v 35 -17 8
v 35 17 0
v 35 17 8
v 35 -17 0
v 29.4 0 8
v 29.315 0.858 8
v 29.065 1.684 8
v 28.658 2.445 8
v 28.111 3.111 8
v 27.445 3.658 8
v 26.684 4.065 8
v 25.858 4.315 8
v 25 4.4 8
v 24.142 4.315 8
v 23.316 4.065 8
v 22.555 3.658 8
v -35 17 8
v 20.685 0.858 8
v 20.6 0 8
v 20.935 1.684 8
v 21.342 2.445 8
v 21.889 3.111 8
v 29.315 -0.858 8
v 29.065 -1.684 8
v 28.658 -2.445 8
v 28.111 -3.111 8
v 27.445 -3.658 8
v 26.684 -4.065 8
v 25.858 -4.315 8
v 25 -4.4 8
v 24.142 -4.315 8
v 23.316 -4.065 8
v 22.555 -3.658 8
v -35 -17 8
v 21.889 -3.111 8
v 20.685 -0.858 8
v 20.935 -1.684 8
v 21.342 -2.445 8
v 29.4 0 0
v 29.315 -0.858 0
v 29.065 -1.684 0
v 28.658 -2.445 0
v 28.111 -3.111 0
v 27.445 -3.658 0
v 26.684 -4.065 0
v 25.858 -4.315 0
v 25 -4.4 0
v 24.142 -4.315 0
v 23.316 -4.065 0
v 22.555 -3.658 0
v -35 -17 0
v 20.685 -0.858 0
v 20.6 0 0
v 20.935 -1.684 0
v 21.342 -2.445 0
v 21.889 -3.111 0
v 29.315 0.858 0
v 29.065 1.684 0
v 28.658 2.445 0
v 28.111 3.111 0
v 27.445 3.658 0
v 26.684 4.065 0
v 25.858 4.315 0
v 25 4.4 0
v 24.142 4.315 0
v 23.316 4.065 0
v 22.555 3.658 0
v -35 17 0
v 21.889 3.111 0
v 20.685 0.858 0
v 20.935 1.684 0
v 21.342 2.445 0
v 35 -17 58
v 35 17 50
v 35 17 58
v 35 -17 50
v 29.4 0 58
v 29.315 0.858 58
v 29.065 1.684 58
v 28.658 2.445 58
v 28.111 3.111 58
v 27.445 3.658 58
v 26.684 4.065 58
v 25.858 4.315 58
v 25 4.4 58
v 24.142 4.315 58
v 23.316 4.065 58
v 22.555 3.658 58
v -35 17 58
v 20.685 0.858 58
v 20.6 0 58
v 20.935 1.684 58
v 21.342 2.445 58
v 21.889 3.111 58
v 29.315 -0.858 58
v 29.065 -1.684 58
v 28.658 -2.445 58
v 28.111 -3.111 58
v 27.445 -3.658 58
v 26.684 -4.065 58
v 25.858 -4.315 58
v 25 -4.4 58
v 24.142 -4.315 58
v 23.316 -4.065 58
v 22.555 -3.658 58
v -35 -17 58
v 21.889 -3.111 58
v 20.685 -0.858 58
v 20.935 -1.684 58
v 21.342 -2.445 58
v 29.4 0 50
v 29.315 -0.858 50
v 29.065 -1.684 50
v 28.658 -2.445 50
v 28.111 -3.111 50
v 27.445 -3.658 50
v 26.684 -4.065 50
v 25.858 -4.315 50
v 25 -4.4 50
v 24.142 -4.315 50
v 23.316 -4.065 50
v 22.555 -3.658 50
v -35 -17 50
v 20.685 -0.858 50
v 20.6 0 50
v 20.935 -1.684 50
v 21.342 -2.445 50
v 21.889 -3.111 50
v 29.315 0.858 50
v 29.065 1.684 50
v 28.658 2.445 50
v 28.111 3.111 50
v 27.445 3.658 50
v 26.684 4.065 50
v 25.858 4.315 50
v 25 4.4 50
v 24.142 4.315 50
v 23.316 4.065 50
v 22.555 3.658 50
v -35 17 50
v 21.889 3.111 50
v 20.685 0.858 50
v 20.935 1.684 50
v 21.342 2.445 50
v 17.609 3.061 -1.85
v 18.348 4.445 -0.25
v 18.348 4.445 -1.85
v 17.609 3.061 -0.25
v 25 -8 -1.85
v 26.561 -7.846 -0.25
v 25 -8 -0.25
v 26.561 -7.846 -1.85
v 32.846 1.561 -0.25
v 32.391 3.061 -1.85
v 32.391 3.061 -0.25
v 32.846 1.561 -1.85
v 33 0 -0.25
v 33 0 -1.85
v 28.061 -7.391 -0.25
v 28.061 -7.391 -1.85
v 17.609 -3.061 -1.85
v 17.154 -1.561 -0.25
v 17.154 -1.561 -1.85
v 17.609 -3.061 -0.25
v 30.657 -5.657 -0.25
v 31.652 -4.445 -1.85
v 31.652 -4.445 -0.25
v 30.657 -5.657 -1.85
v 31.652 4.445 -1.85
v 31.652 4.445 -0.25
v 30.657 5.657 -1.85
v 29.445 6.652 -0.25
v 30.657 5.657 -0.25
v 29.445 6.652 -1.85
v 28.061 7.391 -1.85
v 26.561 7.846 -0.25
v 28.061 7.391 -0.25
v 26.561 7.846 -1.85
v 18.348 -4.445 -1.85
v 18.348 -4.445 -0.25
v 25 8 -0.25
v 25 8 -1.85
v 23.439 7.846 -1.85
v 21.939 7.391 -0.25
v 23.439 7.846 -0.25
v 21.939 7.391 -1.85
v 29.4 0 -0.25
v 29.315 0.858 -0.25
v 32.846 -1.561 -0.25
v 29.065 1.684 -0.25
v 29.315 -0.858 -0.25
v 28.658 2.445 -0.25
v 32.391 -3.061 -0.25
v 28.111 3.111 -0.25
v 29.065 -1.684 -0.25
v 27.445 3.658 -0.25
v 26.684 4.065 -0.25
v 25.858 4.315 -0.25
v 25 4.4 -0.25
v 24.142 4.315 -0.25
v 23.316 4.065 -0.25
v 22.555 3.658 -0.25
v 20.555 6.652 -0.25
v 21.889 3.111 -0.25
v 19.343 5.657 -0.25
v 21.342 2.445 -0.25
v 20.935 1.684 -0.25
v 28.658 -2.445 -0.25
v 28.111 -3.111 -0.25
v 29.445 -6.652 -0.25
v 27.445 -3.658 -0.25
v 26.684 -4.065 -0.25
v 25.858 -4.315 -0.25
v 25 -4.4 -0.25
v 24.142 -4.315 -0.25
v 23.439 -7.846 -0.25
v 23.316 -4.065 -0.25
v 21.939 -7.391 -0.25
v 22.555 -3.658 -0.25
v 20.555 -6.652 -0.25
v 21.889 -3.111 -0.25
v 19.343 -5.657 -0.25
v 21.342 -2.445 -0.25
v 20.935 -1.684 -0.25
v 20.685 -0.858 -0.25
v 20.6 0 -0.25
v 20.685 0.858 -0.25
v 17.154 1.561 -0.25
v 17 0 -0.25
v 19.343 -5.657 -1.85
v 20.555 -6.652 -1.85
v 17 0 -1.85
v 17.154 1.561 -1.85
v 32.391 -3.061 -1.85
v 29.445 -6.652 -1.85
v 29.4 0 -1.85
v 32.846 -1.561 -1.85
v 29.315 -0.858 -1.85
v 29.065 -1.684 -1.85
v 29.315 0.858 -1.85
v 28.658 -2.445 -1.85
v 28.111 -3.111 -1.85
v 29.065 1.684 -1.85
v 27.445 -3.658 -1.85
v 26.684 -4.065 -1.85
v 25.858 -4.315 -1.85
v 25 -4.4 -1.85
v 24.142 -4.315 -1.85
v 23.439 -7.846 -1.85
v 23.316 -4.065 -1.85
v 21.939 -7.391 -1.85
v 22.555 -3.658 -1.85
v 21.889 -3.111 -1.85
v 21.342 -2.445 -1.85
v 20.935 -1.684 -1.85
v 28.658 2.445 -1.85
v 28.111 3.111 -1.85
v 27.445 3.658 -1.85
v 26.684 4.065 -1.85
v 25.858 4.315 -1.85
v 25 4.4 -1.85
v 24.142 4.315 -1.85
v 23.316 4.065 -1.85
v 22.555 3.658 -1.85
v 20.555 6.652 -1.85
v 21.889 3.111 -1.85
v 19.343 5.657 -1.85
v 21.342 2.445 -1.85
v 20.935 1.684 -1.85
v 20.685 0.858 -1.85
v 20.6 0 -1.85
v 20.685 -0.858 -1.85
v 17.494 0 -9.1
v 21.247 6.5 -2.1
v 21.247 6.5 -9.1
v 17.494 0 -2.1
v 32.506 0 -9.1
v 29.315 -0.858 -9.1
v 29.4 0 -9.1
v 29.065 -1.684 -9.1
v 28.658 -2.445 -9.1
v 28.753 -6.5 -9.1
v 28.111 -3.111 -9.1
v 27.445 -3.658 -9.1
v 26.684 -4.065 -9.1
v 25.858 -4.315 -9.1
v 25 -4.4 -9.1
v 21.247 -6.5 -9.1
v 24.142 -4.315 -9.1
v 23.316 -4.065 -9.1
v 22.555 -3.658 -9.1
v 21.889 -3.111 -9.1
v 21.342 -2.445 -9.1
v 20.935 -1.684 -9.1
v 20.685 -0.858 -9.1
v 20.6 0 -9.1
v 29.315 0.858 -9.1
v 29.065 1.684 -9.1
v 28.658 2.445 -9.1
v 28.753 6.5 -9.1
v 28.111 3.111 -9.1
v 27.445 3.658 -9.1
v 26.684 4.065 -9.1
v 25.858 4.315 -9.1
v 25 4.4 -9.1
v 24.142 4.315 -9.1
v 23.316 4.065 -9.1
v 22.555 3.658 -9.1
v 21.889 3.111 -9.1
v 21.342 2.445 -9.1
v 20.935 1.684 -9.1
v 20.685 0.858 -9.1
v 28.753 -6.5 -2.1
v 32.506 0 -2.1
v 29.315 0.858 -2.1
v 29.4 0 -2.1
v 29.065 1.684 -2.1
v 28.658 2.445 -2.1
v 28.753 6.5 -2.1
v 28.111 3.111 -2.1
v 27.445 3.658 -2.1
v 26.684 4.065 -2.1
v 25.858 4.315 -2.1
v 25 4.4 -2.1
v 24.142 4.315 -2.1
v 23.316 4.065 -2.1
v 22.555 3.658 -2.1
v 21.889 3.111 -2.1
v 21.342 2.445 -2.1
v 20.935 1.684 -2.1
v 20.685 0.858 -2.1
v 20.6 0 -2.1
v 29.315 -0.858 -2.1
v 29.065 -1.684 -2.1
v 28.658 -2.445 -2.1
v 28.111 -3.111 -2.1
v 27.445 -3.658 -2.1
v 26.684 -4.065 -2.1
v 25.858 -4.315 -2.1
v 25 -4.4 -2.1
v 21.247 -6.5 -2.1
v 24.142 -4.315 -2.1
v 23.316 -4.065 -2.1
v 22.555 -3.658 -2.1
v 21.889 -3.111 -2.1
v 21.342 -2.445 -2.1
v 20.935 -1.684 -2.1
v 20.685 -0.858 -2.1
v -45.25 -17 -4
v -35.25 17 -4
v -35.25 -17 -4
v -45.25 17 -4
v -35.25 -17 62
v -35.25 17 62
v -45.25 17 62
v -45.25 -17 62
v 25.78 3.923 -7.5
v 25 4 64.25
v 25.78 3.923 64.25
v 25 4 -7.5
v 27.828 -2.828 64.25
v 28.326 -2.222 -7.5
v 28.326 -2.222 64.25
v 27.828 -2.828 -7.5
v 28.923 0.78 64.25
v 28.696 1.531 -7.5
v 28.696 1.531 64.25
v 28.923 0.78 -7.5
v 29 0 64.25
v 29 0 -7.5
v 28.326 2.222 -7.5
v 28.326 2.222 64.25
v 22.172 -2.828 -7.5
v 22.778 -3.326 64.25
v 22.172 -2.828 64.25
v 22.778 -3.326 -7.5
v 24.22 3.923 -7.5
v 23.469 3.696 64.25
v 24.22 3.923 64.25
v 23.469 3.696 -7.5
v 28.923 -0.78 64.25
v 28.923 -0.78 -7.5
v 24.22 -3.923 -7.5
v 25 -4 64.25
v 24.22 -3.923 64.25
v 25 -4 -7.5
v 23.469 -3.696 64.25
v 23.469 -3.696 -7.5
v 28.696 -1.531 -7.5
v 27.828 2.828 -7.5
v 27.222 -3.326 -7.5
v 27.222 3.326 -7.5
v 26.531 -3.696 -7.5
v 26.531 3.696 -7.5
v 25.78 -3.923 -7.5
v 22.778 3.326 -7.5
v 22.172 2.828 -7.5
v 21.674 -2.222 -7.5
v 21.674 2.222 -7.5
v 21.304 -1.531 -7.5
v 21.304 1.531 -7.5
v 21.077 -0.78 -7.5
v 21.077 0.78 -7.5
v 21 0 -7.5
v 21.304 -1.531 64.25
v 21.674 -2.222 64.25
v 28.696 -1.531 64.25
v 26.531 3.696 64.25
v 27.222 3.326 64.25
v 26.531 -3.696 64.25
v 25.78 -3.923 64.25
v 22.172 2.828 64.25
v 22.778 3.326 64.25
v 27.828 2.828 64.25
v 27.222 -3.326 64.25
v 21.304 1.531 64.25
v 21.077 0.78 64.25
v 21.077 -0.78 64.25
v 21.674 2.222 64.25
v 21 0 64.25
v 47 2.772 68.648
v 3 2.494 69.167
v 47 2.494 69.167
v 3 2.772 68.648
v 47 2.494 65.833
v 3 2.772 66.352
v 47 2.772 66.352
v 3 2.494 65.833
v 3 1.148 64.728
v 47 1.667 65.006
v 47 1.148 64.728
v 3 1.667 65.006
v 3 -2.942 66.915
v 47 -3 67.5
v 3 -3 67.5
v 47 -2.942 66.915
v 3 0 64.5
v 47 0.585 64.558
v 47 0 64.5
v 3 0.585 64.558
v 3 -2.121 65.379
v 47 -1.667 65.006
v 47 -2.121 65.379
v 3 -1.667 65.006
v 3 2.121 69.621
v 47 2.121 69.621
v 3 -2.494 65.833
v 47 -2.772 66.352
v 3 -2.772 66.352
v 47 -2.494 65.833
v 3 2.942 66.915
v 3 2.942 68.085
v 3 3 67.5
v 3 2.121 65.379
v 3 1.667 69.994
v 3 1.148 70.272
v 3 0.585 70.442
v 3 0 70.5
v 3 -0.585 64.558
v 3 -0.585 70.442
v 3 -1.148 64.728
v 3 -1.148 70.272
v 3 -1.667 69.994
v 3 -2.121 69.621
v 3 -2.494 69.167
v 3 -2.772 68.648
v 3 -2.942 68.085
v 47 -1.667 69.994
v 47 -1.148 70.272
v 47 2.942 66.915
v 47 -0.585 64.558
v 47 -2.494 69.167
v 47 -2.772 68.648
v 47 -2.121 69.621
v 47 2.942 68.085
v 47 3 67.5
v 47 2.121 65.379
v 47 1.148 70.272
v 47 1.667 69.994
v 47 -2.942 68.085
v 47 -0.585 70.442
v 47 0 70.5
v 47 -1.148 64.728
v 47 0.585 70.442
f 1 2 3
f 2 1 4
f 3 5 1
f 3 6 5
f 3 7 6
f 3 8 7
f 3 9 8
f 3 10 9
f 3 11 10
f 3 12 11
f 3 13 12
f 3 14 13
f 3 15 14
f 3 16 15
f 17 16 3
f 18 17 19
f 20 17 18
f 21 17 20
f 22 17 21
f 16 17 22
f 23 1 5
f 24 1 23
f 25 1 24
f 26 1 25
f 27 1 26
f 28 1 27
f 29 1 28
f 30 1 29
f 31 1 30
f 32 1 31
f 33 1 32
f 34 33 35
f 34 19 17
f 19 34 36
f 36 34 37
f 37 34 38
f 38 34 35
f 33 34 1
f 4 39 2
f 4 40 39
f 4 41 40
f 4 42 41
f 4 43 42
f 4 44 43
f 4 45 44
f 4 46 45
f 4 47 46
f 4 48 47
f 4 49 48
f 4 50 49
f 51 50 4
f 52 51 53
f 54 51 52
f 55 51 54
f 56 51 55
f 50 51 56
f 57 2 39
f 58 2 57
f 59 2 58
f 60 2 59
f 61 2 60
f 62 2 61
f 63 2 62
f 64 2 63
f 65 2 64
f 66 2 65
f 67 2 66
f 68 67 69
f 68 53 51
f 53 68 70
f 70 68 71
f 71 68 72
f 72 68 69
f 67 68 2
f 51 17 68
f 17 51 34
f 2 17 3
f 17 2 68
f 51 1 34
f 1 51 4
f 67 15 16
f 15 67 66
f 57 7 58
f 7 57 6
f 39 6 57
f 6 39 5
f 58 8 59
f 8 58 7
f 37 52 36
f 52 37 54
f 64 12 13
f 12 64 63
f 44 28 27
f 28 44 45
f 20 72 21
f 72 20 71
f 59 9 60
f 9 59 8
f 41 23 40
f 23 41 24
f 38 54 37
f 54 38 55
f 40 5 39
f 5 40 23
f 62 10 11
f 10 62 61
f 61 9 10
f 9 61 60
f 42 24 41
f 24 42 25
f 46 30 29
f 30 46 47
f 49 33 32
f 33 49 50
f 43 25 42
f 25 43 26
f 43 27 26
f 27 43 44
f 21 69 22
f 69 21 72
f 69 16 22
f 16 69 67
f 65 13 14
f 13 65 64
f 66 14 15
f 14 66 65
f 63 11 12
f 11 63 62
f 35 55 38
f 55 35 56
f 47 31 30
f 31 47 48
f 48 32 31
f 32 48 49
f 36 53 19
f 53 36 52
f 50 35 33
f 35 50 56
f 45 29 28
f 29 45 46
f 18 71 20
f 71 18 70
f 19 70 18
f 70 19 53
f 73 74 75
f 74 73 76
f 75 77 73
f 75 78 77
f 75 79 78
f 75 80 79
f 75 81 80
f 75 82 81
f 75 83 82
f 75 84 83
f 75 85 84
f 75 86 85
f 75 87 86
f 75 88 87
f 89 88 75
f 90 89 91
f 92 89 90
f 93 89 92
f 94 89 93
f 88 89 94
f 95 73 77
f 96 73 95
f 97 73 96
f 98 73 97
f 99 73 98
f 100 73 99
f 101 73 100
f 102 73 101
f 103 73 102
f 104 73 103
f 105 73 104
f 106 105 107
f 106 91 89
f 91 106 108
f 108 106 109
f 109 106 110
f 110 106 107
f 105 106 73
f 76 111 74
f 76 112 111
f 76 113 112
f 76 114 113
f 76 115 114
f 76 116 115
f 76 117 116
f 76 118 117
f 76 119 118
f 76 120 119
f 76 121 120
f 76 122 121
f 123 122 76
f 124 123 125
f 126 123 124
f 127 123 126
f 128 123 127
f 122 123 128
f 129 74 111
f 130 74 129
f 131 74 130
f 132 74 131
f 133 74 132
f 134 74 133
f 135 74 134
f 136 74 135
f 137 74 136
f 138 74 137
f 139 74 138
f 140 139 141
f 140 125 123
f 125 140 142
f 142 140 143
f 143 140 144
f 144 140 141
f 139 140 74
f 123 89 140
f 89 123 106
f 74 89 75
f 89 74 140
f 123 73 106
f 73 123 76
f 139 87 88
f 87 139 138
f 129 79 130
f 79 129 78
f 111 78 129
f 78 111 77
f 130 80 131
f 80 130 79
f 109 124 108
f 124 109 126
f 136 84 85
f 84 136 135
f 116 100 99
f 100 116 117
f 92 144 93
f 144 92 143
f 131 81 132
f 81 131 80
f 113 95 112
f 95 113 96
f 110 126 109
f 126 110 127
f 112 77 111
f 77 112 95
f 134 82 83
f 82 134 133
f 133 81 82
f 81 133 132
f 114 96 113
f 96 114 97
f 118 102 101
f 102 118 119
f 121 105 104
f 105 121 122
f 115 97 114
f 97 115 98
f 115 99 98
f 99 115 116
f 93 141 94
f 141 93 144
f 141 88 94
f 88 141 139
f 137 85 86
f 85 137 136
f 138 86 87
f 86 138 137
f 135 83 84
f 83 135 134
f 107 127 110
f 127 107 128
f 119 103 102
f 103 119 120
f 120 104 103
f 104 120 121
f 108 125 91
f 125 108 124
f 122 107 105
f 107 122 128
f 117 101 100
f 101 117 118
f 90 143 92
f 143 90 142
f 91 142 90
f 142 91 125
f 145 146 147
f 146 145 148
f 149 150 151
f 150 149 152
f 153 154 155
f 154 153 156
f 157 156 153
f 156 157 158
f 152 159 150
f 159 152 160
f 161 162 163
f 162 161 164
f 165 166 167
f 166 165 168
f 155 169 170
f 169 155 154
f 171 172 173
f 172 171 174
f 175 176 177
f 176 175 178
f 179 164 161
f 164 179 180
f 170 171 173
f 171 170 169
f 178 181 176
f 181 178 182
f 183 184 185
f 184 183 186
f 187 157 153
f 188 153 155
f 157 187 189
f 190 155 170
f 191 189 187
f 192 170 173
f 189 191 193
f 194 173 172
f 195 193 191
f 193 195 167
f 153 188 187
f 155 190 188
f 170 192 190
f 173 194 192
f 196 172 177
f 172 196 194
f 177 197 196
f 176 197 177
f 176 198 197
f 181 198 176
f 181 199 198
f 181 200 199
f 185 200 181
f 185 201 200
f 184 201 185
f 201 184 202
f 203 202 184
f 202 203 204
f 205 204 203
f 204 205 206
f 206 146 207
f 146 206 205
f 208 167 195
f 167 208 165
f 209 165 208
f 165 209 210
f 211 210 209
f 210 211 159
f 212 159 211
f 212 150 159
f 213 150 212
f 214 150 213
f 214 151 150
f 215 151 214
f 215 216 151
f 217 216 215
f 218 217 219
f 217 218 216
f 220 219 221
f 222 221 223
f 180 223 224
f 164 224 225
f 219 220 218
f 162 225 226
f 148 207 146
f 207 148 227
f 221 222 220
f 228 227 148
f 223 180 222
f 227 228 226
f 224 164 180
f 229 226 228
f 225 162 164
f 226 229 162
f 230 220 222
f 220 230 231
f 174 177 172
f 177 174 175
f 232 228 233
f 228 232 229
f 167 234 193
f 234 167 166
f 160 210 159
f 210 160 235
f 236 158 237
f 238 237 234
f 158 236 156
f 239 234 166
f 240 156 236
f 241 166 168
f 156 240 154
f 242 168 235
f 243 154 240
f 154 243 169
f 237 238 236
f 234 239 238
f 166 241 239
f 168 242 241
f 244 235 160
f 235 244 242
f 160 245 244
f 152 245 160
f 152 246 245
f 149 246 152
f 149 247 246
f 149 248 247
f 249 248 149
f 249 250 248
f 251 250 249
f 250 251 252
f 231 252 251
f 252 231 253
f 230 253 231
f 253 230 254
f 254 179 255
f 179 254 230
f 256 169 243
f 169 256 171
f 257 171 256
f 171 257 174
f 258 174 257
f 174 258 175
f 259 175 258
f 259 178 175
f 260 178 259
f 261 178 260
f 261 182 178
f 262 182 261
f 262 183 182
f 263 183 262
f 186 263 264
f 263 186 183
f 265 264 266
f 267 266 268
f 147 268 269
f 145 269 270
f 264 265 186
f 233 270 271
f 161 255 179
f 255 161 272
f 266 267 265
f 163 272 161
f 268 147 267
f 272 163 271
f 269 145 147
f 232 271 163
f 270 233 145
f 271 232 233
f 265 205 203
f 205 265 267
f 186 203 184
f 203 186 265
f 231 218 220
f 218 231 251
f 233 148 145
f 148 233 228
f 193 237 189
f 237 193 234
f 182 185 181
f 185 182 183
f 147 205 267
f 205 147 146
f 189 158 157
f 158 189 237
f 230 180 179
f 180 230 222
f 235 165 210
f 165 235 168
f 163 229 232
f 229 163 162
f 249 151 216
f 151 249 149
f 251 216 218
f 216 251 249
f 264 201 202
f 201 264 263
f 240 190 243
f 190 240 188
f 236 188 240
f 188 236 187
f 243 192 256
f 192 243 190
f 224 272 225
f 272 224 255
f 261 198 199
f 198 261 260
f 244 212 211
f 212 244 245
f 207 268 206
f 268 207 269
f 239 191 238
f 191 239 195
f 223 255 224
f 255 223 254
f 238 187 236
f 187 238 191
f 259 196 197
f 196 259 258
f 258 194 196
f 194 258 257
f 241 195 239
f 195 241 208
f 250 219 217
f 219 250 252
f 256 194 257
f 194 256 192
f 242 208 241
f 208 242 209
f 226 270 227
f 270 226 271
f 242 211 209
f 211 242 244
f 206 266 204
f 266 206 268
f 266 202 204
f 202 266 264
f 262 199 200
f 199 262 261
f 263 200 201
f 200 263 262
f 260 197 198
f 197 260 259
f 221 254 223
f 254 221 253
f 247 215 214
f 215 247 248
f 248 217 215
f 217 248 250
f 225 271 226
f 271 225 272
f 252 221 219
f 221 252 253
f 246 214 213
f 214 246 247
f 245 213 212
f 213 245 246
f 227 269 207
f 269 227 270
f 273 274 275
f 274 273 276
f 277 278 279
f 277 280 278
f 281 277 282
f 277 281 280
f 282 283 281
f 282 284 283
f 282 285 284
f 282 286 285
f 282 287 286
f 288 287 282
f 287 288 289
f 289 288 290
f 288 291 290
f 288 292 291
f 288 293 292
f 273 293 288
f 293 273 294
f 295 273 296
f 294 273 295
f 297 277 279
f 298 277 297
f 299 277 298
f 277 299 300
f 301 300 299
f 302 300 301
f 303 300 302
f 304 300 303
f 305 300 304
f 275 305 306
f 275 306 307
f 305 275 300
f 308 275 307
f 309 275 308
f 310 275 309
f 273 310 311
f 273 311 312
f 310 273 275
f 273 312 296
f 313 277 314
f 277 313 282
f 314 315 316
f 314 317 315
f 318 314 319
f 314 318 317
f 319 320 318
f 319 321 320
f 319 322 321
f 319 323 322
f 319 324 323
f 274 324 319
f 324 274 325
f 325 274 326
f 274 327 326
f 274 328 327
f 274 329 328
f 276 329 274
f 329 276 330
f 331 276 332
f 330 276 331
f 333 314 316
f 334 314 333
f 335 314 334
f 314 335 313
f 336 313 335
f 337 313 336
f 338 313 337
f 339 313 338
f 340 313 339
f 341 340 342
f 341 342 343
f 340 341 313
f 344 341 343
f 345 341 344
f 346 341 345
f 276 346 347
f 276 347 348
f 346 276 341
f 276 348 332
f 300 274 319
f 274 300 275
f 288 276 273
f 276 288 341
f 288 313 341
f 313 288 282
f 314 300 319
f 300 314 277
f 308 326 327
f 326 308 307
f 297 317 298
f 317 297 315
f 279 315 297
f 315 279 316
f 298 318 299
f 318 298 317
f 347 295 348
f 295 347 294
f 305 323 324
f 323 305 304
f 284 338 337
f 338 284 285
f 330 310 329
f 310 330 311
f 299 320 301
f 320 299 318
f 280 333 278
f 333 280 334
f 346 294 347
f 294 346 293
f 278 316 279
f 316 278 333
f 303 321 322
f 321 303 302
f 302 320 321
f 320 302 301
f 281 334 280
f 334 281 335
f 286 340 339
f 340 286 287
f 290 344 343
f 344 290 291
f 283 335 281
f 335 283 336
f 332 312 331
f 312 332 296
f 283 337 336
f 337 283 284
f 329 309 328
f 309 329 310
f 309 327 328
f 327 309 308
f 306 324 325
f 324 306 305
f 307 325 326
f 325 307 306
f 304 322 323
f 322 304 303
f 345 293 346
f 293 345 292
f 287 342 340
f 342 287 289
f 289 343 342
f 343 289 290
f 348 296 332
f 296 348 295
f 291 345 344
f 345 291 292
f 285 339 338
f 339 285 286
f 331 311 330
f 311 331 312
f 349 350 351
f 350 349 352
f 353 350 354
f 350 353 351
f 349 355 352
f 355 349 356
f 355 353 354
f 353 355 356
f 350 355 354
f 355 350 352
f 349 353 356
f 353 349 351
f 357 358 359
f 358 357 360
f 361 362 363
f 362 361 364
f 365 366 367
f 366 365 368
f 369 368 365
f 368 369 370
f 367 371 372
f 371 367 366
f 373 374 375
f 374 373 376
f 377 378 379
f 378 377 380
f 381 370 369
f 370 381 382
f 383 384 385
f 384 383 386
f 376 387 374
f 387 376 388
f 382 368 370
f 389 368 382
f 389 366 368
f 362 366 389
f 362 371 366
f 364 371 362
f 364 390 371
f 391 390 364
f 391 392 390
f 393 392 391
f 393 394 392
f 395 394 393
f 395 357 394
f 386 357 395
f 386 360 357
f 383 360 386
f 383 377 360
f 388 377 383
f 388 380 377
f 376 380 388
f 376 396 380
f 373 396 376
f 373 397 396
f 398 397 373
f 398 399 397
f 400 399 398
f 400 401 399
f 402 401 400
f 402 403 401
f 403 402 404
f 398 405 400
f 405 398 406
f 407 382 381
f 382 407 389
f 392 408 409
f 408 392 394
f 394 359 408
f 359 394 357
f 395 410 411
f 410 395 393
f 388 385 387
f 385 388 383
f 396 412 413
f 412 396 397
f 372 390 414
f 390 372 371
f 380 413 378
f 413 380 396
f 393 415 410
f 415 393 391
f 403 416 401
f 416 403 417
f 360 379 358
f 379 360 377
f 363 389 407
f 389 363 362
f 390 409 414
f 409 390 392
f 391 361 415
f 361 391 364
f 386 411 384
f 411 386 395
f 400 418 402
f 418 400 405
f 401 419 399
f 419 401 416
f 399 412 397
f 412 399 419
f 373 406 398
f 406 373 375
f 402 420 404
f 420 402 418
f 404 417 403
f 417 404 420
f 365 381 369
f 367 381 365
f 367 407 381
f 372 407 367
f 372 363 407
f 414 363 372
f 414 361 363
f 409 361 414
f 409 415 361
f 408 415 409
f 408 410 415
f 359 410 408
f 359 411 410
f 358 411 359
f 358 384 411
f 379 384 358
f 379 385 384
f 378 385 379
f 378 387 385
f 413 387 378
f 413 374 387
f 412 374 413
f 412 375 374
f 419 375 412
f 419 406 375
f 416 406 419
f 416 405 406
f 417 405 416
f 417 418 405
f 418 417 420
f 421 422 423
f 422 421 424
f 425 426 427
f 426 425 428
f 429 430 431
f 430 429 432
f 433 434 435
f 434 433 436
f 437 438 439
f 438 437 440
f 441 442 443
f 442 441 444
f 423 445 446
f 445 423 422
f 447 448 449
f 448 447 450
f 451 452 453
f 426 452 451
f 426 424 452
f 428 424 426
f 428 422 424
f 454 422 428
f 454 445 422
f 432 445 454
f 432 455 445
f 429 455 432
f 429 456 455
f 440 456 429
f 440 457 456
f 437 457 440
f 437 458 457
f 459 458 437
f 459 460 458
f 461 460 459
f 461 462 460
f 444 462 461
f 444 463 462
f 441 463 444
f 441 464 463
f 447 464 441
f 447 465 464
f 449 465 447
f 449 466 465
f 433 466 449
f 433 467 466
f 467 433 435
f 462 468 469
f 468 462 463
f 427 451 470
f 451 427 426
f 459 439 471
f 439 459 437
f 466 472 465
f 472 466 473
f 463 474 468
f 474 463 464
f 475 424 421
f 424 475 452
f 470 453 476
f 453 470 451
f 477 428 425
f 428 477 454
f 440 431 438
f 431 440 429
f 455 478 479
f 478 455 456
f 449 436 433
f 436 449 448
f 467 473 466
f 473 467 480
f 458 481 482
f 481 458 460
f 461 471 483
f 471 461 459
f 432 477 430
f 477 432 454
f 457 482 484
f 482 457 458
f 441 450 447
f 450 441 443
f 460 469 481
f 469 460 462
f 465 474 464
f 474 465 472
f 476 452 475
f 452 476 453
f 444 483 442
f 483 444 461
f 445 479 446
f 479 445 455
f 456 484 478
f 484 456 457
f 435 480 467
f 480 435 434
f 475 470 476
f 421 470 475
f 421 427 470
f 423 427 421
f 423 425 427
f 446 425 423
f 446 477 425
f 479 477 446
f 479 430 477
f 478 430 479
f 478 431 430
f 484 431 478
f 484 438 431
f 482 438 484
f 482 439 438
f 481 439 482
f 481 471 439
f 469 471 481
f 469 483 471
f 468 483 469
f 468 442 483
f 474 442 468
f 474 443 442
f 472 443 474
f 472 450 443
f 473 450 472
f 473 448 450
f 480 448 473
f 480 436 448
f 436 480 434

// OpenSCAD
$fn = 32;

// ------------------------------------------------------------------------
// C clamp: throat 50 mm, screw d8
// Every part is its own module, assembly() places every instance.
// ------------------------------------------------------------------------

// --- part 1 ---
module clamp_arm() {
  difference() {
    translate([-35, -17, 0]) cube([70, 34, 8]);
    translate([25, 0, -1]) cylinder(h = 10, d = 8.8);
  }
}

// --- part 2 ---
module clamp_spine() {
  difference() {
    translate([-33, -17, 0]) cube([66, 34, 10]);
  }
}

// --- part 3 ---
module clamp_screw() {
  translate([0, 0, -35.875]) cylinder(h = 71.75, d = 8);
}

// --- part 4 ---
module clamp_washer() {
  difference() {
      translate([0, 0, 0]) cylinder(h = 1.6, d = 16);
      translate([0, 0, -1]) cylinder(h = 3.6, d = 8.8);
    }
}

// --- part 5 ---
module clamp_nut() {
  difference() {
    linear_extrude(height = 7) polygon(points = [[7.506, 0], [3.753, 6.5], [-3.753, 6.5], [-7.506, 0], [-3.753, -6.5], [3.753, -6.5]]);
    translate([0, 0, -1]) cylinder(h = 9, d = 8.8);
  }
}

// --- part 6 ---
module tommy_bar() {
  translate([0, 0, -22]) cylinder(h = 44, d = 6);
}

// --- assembly ---
module assembly() {
  color([0.80, 0.24, 0.20]) translate([0, 0, 0]) rotate([0, 0, 0]) clamp_arm();
  color([0.20, 0.45, 0.75]) translate([0, 0, 50]) rotate([0, 0, 0]) clamp_arm();
  color([0.25, 0.62, 0.32]) translate([-45.25, 0, 29]) rotate([0, 90, 0]) clamp_spine();
  color([0.92, 0.70, 0.18]) translate([25, 0, 28.375]) rotate([0, 0, 0]) clamp_screw();
  color([0.58, 0.35, 0.70]) translate([25, 0, -1.85]) rotate([0, 0, 0]) clamp_washer();
  color([0.16, 0.66, 0.66]) translate([25, 0, -9.1]) rotate([0, 0, 0]) clamp_nut();
  color([0.85, 0.48, 0.18]) translate([25, 0, 67.5]) rotate([0, 90, 0]) tommy_bar();
}

assembly();
